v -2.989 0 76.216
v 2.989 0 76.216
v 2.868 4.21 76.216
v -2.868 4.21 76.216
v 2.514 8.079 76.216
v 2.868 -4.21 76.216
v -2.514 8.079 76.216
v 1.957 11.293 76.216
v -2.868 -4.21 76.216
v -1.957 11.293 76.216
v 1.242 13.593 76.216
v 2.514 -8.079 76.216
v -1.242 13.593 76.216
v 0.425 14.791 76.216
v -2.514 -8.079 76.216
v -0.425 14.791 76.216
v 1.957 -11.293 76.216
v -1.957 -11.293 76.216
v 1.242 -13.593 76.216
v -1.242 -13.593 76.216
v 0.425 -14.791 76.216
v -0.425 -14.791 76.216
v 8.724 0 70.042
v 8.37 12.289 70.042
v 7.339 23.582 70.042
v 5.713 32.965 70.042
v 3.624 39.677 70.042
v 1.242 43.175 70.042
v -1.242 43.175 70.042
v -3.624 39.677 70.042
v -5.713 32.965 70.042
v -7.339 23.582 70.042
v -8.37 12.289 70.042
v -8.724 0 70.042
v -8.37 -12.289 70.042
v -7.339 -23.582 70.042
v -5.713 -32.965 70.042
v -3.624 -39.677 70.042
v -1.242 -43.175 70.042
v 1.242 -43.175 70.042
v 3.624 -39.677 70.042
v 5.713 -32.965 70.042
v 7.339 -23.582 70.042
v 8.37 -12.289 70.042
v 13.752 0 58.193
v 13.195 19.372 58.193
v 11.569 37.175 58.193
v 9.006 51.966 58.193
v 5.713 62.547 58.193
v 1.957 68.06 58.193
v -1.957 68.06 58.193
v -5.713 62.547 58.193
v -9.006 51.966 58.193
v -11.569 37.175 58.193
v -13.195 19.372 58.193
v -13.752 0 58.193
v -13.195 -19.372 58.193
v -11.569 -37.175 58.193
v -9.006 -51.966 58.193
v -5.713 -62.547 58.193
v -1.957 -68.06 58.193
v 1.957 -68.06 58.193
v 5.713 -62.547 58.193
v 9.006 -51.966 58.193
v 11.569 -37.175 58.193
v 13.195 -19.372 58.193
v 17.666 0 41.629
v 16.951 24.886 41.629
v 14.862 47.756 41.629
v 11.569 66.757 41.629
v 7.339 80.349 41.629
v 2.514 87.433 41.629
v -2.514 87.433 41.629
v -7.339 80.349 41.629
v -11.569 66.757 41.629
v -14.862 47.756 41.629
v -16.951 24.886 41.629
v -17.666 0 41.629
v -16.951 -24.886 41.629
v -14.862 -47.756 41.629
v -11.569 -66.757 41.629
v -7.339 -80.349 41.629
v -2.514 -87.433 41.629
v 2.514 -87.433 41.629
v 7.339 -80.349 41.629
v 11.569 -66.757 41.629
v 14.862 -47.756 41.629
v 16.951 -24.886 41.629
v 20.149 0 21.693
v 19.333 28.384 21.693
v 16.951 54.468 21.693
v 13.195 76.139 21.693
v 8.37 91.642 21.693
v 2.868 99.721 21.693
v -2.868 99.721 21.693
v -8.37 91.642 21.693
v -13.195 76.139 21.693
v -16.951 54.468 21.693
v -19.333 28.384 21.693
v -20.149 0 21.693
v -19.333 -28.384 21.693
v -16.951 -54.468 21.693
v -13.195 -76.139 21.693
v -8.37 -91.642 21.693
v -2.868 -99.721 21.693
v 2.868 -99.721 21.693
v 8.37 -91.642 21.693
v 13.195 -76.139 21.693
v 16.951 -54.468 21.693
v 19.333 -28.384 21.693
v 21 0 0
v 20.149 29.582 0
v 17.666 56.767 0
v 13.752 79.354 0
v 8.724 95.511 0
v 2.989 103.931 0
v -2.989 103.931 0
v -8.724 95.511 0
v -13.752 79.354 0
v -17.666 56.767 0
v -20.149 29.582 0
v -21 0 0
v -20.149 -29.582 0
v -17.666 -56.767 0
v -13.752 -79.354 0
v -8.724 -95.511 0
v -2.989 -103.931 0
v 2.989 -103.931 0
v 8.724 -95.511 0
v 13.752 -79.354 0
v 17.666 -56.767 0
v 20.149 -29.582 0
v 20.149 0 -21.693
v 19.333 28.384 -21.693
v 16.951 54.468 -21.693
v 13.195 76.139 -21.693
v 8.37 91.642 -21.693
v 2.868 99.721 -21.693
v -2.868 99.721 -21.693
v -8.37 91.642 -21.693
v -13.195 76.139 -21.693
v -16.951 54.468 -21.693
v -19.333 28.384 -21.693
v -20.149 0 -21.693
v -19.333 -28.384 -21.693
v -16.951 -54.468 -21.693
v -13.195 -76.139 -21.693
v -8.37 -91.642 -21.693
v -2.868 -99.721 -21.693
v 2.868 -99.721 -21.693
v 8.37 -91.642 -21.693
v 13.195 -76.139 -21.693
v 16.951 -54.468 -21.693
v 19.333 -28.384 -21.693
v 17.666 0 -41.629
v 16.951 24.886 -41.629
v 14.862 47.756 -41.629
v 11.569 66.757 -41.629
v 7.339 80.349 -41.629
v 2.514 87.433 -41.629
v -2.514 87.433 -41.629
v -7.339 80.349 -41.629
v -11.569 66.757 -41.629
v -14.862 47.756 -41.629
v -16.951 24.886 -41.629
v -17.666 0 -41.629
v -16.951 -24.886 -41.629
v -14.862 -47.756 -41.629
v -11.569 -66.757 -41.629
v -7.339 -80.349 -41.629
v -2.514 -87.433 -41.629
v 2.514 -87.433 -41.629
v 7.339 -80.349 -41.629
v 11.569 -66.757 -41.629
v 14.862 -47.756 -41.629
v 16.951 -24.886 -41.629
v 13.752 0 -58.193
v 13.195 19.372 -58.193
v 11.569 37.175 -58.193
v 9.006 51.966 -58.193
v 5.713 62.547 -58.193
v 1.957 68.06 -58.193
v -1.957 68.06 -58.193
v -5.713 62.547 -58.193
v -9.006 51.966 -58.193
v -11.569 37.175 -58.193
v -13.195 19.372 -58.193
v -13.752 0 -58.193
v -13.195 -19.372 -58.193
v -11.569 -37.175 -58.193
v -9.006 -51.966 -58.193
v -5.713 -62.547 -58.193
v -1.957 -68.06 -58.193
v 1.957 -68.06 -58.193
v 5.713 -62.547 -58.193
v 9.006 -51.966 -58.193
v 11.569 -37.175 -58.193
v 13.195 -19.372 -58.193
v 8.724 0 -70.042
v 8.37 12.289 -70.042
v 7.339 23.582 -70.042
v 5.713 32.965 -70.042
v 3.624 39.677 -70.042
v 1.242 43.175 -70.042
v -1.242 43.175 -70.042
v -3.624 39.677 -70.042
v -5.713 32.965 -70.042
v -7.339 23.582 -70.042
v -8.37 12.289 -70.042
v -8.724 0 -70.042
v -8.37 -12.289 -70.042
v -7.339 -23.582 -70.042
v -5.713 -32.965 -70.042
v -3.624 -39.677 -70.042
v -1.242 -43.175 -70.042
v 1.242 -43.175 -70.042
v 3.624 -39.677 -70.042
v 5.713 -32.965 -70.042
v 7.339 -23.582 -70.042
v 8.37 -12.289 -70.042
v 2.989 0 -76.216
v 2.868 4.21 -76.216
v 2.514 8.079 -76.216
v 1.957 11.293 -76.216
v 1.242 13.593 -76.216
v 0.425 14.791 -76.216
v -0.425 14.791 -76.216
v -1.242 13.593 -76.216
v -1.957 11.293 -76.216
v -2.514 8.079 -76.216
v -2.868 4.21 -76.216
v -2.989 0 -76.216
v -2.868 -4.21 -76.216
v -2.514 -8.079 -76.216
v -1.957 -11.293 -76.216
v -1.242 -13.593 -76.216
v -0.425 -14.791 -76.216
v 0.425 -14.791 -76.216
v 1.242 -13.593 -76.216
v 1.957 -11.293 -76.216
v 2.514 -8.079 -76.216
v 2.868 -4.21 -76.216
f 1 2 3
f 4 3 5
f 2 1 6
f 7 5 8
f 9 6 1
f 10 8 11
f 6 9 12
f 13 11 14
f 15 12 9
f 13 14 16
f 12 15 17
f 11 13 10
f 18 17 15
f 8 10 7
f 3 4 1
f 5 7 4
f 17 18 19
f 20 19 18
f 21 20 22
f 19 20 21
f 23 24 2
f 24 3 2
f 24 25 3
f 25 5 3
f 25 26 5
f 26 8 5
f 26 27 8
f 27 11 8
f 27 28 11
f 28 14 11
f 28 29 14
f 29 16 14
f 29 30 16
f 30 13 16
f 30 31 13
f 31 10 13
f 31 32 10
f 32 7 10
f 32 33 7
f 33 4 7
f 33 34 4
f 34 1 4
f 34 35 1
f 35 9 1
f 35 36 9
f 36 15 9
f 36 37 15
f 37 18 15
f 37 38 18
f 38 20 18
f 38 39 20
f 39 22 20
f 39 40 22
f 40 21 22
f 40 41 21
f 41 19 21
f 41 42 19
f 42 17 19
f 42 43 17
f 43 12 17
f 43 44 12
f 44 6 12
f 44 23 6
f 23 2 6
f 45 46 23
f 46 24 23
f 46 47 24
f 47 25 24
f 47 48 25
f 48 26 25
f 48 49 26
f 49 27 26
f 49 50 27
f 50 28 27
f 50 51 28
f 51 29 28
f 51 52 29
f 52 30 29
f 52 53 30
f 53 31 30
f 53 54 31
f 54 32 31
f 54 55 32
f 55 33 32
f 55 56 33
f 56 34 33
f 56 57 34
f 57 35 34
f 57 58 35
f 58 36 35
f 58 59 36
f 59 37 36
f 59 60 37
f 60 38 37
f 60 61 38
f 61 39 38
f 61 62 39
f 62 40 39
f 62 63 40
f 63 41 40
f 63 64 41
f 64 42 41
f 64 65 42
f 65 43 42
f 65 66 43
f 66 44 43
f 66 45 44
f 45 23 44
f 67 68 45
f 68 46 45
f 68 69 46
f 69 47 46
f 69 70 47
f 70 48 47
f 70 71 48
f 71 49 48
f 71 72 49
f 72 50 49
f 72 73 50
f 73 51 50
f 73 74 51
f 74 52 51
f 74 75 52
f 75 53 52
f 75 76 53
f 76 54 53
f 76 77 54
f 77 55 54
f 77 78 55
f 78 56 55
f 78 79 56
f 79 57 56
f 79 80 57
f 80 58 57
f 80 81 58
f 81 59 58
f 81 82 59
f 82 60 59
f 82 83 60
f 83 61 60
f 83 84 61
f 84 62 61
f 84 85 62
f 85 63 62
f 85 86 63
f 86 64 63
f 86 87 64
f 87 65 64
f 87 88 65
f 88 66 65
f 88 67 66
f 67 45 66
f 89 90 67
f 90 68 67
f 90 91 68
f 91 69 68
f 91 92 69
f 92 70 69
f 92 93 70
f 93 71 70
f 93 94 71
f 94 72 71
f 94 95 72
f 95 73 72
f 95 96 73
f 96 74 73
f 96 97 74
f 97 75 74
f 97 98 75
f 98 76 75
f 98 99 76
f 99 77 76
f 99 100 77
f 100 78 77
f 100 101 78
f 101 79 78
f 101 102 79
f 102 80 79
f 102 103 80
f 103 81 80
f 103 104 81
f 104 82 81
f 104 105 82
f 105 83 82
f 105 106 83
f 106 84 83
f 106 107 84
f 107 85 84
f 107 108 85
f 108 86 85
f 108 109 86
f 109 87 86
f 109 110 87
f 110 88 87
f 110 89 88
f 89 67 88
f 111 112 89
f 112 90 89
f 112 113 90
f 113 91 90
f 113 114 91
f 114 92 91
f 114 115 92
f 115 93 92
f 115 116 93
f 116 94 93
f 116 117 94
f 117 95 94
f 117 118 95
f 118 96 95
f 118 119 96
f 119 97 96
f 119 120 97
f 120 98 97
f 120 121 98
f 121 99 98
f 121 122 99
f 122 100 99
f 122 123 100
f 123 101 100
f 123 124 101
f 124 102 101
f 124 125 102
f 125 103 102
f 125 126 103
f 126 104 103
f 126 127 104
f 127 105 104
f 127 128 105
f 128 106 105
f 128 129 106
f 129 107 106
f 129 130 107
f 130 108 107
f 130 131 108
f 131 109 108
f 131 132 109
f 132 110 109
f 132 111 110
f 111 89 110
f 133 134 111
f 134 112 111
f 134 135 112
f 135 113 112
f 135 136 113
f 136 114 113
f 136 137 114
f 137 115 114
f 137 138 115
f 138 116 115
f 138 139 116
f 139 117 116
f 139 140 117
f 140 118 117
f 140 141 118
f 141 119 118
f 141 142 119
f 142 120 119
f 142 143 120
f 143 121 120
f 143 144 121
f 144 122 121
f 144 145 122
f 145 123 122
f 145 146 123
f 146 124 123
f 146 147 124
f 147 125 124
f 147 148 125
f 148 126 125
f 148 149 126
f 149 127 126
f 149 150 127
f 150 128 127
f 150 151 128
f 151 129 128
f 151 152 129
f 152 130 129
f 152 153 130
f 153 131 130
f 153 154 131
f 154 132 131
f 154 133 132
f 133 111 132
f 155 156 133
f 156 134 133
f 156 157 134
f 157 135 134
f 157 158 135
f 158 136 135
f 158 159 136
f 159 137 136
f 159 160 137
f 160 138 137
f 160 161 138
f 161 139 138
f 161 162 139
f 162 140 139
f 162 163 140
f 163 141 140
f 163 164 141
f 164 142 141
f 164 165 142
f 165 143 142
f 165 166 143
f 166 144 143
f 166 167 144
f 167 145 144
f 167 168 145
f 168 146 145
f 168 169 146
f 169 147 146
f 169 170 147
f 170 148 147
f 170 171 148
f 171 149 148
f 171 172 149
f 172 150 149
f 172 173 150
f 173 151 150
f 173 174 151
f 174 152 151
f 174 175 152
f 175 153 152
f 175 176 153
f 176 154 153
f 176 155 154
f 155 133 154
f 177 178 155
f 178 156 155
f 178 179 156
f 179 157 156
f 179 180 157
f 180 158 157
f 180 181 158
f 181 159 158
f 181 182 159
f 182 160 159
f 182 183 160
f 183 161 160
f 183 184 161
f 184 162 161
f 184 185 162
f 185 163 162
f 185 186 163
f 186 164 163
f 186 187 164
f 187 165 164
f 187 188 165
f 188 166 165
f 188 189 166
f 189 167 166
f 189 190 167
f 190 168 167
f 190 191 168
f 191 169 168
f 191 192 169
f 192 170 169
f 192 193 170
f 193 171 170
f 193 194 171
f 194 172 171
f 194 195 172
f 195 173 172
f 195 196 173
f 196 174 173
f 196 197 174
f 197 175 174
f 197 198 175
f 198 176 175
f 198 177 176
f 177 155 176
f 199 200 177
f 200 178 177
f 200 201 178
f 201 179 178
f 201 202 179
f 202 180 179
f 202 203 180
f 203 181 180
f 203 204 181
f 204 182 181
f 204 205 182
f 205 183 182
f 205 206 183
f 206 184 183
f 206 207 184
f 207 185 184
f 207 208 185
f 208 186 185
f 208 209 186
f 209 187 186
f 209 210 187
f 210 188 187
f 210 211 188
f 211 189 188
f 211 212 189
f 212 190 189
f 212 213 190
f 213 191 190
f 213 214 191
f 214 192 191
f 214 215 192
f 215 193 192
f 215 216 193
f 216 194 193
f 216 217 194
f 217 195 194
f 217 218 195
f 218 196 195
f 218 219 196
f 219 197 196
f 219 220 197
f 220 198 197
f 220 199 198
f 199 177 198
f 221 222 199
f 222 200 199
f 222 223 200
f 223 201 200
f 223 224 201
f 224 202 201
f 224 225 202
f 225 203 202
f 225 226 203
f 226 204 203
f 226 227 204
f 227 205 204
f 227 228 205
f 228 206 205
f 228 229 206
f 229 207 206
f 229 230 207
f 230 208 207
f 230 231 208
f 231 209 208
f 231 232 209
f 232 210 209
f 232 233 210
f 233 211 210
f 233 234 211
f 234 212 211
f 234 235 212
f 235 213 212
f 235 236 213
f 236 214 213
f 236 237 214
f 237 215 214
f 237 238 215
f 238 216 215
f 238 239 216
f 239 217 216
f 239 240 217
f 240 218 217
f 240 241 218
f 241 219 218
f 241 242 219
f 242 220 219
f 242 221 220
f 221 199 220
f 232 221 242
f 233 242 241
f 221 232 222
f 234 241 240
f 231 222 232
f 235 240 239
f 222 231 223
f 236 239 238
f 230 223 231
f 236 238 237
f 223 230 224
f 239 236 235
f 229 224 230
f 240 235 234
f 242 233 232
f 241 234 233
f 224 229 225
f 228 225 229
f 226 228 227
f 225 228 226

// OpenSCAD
// Generated by SolidPython 1.0.1 on 2020-07-29 00:46:45


scale(v = [3, 15, 11]) {
	sphere(r = 7);
}
/***********************************************
*********      SolidPython code:      **********
************************************************
 
# import packages: SolidPython
from solid import *
from solid.utils import *
from itertools import chain, combinations, permutations


class Resize:

    def __init__(self, scad_file):
        self.scad_file = scad_file
        #self.scad_file = import_scad(scad_file)
        # cone/cylinder param:
        self.r1 = 0
        self.r2 = 0
        self.h = 0
        # rectangular prism param:
        self.w = 0
        self.l = 0
        # ellipse param:
        self.r = 0

    # import OpenScad code (file name corresponds to shape)


    # classify shape + parameters
    def assign(self, param1, param2, param3):
        if self.scad_file == 'cone.scad':
            self.r1 = param1
            self.r2 = param2
            self.h = param3
        elif self.scad_file == 'cylinder.scad':
            self.r1 = param1
            self.r2 = param2
            self.h = param3
        elif self.scad_file == 'rectangularPrism.scad':
            self.h = param1
            self.l = param2
            self.w = param3
        else:
            self.r = param1
            self.h = param2

    # resize parameters
    def iterate(self):
        x = range(3, 20, 2)
        i = 1
        if self.scad_file == 'cone.scad':
            tempList = list(permutations(x, 2))
            for temp in tempList:
                param1 = temp[0]
                param2 = temp[1]
                filepath = 'produced_scad_files/' + 'cone' + str(param1) + '_' + str(param2) + '_' + '.scad'
                scad_render_to_file(cylinder(h=param1, r1=param2, r2=0), filepath)

        elif self.scad_file == 'cylinder.scad':
            tempList = list(permutations(x, 3))
            for temp in tempList:
                param1 = temp[0]
                param2 = temp[1]
                filepath = 'produced_scad_files/' + 'cylinder' + str(param1) + '_' + str(param2) + '_' + '.scad'
                scad_render_to_file(cylinder(h=param1, r1=param2, r2=param2), filepath)

        elif self.scad_file == 'rectangularPrism.scad':
            tempList = list(permutations(x, 3))
            for temp in tempList:
                param1 = temp[0]
                param2 = temp[1]
                param3 = temp[2]
                filepath = 'produced_scad_files/' + 'rectangularPrism' + str(param1) + '_' + str(param2) + '_' + str(
                    param3) + '.scad'
                scad_render_to_file(cube(size=(param1, param2, param3)), filepath)

        elif self.scad_file == 'ellipse.scad':
            tempList = list(permutations(x, 4))
            for temp in tempList:
                param1 = temp[0]
                param2 = temp[1]
                param3 = temp[2]
                param4 = temp[3]
                filepath = 'produced_scad_files/' + 'ellipse' + str(param1) + '_' + str(param2) + '_' + str(param3) + '_' + str(param4) + '.scad'
                scad_render_to_file(scale([param1, param2, param3])(sphere(r=param4)), filepath)

    def render_to_scadfile(self):
        scad_render_to_file(scad, 'example.scad') 
 
************************************************/
